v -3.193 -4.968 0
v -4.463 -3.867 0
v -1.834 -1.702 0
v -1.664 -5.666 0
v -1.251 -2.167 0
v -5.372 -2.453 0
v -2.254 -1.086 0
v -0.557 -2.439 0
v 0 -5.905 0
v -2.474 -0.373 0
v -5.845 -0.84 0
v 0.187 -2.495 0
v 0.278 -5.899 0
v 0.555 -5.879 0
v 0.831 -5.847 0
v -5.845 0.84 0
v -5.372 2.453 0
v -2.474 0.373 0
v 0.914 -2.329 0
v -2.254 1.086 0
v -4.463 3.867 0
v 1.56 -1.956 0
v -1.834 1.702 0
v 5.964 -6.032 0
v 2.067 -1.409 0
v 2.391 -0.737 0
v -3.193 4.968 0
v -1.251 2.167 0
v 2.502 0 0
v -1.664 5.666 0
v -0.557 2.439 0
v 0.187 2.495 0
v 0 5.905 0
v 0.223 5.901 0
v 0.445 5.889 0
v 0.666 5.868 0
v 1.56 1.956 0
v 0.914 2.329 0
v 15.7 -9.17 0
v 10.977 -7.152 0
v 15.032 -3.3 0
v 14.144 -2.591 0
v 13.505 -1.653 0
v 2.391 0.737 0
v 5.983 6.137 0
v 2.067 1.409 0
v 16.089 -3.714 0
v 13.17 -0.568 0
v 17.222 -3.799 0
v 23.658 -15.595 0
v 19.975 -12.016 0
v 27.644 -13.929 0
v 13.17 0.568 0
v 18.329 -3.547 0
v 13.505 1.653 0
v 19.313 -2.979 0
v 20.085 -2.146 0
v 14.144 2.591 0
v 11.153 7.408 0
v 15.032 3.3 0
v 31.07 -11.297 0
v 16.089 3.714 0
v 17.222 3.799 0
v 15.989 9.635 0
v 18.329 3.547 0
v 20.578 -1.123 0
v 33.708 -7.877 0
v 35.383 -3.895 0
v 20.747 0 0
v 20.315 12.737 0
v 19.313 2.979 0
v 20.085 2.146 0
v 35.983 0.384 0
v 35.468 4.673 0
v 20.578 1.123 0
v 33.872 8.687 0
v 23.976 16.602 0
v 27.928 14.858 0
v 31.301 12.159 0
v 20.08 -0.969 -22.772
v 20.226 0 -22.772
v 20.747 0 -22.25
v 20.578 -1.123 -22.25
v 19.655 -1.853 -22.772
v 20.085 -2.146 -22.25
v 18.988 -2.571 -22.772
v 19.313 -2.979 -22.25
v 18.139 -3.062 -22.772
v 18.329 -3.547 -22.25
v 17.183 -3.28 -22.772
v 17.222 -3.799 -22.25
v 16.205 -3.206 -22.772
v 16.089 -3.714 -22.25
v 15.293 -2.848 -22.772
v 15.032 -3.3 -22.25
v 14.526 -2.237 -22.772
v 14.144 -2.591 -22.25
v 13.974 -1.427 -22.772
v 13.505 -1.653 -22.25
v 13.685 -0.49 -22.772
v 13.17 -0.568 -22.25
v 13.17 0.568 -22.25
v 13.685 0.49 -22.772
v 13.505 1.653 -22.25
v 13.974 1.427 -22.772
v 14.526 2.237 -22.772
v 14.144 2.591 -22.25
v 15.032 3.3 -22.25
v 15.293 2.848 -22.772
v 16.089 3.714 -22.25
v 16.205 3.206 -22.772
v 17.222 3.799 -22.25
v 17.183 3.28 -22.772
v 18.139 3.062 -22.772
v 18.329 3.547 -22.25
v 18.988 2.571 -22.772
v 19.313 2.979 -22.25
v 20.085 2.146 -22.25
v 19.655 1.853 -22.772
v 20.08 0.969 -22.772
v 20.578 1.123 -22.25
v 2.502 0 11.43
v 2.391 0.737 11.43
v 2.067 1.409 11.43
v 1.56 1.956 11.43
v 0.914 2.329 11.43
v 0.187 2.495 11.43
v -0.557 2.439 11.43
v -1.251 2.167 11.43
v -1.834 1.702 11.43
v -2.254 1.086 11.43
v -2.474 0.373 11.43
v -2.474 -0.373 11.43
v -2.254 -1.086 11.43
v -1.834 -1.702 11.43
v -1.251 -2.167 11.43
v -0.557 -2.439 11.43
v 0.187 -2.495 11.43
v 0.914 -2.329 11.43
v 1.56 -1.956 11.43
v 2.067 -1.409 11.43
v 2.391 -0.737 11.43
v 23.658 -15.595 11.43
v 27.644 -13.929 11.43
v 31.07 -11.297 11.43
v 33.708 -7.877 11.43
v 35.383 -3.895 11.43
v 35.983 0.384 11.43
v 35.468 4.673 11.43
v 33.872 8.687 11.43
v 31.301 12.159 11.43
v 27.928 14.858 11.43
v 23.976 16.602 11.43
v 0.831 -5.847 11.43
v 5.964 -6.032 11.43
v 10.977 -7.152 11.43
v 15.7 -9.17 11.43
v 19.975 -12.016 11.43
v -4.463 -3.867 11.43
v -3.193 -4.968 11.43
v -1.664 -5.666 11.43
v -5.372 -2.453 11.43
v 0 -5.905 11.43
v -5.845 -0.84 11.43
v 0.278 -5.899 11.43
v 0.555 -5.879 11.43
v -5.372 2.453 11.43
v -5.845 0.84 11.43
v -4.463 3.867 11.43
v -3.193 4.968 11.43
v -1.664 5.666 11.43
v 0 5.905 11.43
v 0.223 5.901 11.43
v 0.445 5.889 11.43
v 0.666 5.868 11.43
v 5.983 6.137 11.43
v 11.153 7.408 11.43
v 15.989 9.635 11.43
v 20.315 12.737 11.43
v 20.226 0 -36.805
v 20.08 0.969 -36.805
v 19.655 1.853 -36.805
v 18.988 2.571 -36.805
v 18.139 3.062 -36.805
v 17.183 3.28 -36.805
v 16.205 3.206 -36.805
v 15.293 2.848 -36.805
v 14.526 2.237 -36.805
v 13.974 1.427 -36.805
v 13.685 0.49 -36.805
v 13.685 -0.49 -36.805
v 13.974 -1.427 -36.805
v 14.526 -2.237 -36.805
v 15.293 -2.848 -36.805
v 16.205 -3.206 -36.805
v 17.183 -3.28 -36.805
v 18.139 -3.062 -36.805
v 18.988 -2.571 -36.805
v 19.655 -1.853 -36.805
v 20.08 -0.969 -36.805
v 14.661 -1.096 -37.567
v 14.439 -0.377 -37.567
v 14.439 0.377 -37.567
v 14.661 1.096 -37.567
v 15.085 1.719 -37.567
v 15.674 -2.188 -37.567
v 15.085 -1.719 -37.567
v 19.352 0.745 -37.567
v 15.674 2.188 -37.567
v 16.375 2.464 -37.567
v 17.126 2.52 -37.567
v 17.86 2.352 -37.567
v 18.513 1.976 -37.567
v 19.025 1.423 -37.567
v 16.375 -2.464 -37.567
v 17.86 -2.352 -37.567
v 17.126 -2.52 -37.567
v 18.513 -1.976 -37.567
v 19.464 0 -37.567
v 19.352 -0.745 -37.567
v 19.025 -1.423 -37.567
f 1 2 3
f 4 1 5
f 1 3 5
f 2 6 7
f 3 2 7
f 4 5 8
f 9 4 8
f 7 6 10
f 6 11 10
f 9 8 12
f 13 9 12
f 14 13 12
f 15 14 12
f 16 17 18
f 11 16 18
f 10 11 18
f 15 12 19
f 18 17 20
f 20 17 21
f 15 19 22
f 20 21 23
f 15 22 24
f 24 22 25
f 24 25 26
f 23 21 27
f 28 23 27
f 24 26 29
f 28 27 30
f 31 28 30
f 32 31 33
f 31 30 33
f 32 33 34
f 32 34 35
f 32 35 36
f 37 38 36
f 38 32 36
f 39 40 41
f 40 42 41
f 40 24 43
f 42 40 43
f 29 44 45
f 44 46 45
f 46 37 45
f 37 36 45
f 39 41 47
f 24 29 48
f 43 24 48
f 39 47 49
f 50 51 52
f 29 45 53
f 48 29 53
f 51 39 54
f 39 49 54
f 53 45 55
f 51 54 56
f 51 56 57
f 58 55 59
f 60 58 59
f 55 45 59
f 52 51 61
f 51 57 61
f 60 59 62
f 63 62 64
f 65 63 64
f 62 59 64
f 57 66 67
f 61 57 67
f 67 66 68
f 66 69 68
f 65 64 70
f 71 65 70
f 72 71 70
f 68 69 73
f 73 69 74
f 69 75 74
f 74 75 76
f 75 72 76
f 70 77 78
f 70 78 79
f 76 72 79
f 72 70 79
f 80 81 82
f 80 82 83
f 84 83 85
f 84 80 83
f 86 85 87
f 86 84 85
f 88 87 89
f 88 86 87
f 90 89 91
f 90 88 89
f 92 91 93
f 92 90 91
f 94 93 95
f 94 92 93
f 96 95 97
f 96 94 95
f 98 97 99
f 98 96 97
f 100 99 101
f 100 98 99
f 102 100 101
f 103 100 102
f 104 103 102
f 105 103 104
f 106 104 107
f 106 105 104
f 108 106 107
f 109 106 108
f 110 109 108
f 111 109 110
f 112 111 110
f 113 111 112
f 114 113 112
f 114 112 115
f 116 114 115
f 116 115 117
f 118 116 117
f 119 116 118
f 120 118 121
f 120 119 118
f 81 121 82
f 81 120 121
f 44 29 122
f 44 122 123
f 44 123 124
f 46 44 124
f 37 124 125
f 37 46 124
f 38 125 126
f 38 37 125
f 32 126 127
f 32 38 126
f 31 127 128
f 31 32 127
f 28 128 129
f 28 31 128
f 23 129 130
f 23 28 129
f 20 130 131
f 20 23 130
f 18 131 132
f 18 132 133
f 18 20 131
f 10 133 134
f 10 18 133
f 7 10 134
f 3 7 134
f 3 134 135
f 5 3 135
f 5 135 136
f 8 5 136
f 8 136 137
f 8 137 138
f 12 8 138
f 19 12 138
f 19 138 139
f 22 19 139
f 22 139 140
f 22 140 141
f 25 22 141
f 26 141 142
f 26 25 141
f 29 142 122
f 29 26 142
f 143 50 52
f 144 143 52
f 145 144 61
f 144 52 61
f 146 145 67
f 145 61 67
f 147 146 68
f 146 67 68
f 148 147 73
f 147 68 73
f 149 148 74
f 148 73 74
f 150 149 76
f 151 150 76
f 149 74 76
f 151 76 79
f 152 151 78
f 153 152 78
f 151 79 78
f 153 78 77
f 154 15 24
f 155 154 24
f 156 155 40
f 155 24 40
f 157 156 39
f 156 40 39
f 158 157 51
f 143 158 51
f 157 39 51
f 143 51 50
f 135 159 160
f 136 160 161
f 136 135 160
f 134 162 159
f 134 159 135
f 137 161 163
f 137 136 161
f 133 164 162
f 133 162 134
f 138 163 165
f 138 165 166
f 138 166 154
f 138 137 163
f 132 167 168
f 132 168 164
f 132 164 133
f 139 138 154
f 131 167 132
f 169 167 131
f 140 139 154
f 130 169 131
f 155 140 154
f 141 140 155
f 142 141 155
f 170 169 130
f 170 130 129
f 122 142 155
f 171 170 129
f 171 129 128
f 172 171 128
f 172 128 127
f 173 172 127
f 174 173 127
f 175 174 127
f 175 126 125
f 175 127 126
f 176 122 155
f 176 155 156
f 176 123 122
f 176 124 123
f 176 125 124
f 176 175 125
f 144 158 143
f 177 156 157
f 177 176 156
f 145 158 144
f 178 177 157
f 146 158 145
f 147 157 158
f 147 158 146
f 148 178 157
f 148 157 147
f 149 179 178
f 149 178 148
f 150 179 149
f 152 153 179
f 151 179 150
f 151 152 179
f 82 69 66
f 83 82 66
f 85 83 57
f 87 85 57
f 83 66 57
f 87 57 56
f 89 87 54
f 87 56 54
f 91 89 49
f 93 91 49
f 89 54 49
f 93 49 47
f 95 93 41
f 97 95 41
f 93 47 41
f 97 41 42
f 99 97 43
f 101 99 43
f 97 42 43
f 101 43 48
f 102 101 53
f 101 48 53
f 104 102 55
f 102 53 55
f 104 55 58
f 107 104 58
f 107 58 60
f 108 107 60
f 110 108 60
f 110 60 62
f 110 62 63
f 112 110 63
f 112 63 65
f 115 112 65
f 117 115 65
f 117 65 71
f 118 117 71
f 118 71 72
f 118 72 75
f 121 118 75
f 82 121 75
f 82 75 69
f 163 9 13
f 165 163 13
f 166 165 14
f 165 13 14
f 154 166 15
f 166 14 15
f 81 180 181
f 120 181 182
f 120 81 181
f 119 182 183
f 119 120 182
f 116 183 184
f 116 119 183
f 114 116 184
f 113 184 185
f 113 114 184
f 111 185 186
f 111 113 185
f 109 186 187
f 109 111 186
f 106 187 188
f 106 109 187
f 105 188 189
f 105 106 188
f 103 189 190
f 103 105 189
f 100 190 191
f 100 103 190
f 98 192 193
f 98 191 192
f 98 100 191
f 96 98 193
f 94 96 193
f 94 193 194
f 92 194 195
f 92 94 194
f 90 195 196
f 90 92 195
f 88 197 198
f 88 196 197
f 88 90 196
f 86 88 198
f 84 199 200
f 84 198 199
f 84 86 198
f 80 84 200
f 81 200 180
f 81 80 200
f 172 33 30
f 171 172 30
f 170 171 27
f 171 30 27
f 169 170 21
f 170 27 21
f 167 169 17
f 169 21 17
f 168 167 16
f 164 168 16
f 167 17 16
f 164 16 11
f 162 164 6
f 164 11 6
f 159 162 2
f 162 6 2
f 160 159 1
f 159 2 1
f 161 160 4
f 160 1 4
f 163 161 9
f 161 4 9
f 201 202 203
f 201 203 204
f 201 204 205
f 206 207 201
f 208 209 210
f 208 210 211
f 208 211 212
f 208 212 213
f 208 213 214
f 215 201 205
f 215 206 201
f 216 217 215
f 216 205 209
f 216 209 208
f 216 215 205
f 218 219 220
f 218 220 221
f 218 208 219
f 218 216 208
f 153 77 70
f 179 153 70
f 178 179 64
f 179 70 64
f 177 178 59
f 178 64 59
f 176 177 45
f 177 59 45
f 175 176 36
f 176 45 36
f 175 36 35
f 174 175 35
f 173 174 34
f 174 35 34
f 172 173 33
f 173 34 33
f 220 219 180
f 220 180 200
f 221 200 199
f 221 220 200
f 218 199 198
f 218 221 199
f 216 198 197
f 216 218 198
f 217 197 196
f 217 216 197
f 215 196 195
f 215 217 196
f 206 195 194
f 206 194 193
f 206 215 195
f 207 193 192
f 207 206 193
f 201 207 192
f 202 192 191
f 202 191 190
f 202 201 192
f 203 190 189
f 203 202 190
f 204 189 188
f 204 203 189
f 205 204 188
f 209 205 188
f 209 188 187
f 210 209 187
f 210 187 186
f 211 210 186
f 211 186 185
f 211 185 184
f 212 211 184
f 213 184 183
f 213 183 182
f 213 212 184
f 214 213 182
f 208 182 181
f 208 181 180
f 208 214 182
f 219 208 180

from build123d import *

# Parameters (mm, degrees)
F0_R        = 2.5019
F1_DEPTH    = 11.43
F2_R        = 3.81
F3_DEPTH    = 23.0124
F4_R        = 3.2888740004
F5_DEPTH    = 14.5542
F6_S5_R     = 3.2888740004
F6_T6_DEPTH = 7
F7_SIZE     = 0.762


# Not quite as in the source:
# - a fillet or chamfer that OpenCascade refuses, or shapes differently, is made with other operations: its cross-section is extruded or revolved along the edge and cut away or added


with BuildPart() as f1:
    # F0 (on Top) → F1 (new body)
    with BuildSketch(Plane.XY):
        with BuildLine():
            ThreePointArc((23.9757987458, 16.602474899), (13.6238224038, 8.4064756981), (0.6664771358, 5.8677711678))
            ThreePointArc((0.6664771358, 5.8677711678), (4.4051566928, 3.9331316736), (5.9055, 0))
            ThreePointArc((5.9055, 0), (4.4601151914, -3.8706979641), (0.8314833277, -5.8466713372))
            ThreePointArc((0.8314833277, -5.8466713372), (13.3845311249, -8.052459978), (23.6582204203, -15.5953918211))
            ThreePointArc((23.6582204203, -15.5953918211), (35.9831697874, 0.3835426329), (23.9757987458, 16.602474899))
        make_face()
        with BuildLine():
            ThreePointArc((0.6664771358, 5.8677711678), (0.333126091, 5.8846486866), (0, 5.9055))
            ThreePointArc((0, 5.9055), (-5.9055, 0), (0, -5.9055))
            ThreePointArc((0, -5.9055), (0.4155226631, -5.8729903159), (0.8314833277, -5.8466713372))
            ThreePointArc((0.8314833277, -5.8466713372), (4.4601151914, -3.8706979641), (5.9055, 0))
            ThreePointArc((5.9055, 0), (4.4051566928, 3.9331316736), (0.6664771358, 5.8677711678))
        make_face()
        Circle(F0_R, mode=Mode.SUBTRACT)
        with BuildLine():
            ThreePointArc((0.6664771358, 5.8677711678), (0.3337720919, 5.8960602474), (0, 5.9055))
            ThreePointArc((0, 5.9055), (0.333126091, 5.8846486866), (0.6664771358, 5.8677711678))
        make_face()
        with BuildLine():
            ThreePointArc((0.8314833277, -5.8466713372), (0.4155226631, -5.8729903159), (0, -5.9055))
            ThreePointArc((0, -5.9055), (0.4167809184, -5.8907744751), (0.8314833277, -5.8466713372))
        make_face()
    extrude(amount=F1_DEPTH)

    # F2 (on face) → F3 (join)
    with BuildSketch(Plane(origin=(0, 0, 0), x_dir=(1, 0, 0), z_dir=(0, 0, -1))):
        with Locations((16.9372853817, 0)):
            Circle(F2_R)
    extrude(amount=F3_DEPTH)

    # F4 (on face) → F5 (join)
    with BuildSketch(Plane(origin=(0, 0, -23.0124), x_dir=(1, 0, 0), z_dir=(0, 0, -1))):
        with Locations((16.9372853817, 0)):
            Circle(F4_R)
    extrude(amount=F5_DEPTH)

    # F6: chamfer of 0.762 on 1 edges, made by hand


with BuildPart() as f6_tool2:
    # F6_s3 → F6_t4 (revolve)
    with BuildSketch(Plane.XZ):
        Polygon((20.7472853817, -22.2504), (19.9852853817, -23.0124), (20.7472853817, -23.0124), align=None)
    revolve(axis=Axis((16.9372853817, 0, -23.0124), (0, 0, -1)))

    # F6_s5 → F6_t6 (cut, symmetric)
    with BuildSketch(Plane.XY.offset(-22.6)):
        with Locations((16.9372853817, 0)):
            Circle(F6_S5_R)
    extrude(amount=F6_T6_DEPTH, both=True, mode=Mode.SUBTRACT)


with BuildPart() as f1_1:
    add(f1.part)

    # F6_t1: cut F6_tool2
    add(f6_tool2.part, mode=Mode.SUBTRACT)

    # F7
    f7_edges = [f1_1.edges().sort_by_distance(p)[0] for p in [
        (13.648411, 0, -37.5666),
    ]]
    chamfer(f7_edges, length=F7_SIZE)


solid = f1_1.part
